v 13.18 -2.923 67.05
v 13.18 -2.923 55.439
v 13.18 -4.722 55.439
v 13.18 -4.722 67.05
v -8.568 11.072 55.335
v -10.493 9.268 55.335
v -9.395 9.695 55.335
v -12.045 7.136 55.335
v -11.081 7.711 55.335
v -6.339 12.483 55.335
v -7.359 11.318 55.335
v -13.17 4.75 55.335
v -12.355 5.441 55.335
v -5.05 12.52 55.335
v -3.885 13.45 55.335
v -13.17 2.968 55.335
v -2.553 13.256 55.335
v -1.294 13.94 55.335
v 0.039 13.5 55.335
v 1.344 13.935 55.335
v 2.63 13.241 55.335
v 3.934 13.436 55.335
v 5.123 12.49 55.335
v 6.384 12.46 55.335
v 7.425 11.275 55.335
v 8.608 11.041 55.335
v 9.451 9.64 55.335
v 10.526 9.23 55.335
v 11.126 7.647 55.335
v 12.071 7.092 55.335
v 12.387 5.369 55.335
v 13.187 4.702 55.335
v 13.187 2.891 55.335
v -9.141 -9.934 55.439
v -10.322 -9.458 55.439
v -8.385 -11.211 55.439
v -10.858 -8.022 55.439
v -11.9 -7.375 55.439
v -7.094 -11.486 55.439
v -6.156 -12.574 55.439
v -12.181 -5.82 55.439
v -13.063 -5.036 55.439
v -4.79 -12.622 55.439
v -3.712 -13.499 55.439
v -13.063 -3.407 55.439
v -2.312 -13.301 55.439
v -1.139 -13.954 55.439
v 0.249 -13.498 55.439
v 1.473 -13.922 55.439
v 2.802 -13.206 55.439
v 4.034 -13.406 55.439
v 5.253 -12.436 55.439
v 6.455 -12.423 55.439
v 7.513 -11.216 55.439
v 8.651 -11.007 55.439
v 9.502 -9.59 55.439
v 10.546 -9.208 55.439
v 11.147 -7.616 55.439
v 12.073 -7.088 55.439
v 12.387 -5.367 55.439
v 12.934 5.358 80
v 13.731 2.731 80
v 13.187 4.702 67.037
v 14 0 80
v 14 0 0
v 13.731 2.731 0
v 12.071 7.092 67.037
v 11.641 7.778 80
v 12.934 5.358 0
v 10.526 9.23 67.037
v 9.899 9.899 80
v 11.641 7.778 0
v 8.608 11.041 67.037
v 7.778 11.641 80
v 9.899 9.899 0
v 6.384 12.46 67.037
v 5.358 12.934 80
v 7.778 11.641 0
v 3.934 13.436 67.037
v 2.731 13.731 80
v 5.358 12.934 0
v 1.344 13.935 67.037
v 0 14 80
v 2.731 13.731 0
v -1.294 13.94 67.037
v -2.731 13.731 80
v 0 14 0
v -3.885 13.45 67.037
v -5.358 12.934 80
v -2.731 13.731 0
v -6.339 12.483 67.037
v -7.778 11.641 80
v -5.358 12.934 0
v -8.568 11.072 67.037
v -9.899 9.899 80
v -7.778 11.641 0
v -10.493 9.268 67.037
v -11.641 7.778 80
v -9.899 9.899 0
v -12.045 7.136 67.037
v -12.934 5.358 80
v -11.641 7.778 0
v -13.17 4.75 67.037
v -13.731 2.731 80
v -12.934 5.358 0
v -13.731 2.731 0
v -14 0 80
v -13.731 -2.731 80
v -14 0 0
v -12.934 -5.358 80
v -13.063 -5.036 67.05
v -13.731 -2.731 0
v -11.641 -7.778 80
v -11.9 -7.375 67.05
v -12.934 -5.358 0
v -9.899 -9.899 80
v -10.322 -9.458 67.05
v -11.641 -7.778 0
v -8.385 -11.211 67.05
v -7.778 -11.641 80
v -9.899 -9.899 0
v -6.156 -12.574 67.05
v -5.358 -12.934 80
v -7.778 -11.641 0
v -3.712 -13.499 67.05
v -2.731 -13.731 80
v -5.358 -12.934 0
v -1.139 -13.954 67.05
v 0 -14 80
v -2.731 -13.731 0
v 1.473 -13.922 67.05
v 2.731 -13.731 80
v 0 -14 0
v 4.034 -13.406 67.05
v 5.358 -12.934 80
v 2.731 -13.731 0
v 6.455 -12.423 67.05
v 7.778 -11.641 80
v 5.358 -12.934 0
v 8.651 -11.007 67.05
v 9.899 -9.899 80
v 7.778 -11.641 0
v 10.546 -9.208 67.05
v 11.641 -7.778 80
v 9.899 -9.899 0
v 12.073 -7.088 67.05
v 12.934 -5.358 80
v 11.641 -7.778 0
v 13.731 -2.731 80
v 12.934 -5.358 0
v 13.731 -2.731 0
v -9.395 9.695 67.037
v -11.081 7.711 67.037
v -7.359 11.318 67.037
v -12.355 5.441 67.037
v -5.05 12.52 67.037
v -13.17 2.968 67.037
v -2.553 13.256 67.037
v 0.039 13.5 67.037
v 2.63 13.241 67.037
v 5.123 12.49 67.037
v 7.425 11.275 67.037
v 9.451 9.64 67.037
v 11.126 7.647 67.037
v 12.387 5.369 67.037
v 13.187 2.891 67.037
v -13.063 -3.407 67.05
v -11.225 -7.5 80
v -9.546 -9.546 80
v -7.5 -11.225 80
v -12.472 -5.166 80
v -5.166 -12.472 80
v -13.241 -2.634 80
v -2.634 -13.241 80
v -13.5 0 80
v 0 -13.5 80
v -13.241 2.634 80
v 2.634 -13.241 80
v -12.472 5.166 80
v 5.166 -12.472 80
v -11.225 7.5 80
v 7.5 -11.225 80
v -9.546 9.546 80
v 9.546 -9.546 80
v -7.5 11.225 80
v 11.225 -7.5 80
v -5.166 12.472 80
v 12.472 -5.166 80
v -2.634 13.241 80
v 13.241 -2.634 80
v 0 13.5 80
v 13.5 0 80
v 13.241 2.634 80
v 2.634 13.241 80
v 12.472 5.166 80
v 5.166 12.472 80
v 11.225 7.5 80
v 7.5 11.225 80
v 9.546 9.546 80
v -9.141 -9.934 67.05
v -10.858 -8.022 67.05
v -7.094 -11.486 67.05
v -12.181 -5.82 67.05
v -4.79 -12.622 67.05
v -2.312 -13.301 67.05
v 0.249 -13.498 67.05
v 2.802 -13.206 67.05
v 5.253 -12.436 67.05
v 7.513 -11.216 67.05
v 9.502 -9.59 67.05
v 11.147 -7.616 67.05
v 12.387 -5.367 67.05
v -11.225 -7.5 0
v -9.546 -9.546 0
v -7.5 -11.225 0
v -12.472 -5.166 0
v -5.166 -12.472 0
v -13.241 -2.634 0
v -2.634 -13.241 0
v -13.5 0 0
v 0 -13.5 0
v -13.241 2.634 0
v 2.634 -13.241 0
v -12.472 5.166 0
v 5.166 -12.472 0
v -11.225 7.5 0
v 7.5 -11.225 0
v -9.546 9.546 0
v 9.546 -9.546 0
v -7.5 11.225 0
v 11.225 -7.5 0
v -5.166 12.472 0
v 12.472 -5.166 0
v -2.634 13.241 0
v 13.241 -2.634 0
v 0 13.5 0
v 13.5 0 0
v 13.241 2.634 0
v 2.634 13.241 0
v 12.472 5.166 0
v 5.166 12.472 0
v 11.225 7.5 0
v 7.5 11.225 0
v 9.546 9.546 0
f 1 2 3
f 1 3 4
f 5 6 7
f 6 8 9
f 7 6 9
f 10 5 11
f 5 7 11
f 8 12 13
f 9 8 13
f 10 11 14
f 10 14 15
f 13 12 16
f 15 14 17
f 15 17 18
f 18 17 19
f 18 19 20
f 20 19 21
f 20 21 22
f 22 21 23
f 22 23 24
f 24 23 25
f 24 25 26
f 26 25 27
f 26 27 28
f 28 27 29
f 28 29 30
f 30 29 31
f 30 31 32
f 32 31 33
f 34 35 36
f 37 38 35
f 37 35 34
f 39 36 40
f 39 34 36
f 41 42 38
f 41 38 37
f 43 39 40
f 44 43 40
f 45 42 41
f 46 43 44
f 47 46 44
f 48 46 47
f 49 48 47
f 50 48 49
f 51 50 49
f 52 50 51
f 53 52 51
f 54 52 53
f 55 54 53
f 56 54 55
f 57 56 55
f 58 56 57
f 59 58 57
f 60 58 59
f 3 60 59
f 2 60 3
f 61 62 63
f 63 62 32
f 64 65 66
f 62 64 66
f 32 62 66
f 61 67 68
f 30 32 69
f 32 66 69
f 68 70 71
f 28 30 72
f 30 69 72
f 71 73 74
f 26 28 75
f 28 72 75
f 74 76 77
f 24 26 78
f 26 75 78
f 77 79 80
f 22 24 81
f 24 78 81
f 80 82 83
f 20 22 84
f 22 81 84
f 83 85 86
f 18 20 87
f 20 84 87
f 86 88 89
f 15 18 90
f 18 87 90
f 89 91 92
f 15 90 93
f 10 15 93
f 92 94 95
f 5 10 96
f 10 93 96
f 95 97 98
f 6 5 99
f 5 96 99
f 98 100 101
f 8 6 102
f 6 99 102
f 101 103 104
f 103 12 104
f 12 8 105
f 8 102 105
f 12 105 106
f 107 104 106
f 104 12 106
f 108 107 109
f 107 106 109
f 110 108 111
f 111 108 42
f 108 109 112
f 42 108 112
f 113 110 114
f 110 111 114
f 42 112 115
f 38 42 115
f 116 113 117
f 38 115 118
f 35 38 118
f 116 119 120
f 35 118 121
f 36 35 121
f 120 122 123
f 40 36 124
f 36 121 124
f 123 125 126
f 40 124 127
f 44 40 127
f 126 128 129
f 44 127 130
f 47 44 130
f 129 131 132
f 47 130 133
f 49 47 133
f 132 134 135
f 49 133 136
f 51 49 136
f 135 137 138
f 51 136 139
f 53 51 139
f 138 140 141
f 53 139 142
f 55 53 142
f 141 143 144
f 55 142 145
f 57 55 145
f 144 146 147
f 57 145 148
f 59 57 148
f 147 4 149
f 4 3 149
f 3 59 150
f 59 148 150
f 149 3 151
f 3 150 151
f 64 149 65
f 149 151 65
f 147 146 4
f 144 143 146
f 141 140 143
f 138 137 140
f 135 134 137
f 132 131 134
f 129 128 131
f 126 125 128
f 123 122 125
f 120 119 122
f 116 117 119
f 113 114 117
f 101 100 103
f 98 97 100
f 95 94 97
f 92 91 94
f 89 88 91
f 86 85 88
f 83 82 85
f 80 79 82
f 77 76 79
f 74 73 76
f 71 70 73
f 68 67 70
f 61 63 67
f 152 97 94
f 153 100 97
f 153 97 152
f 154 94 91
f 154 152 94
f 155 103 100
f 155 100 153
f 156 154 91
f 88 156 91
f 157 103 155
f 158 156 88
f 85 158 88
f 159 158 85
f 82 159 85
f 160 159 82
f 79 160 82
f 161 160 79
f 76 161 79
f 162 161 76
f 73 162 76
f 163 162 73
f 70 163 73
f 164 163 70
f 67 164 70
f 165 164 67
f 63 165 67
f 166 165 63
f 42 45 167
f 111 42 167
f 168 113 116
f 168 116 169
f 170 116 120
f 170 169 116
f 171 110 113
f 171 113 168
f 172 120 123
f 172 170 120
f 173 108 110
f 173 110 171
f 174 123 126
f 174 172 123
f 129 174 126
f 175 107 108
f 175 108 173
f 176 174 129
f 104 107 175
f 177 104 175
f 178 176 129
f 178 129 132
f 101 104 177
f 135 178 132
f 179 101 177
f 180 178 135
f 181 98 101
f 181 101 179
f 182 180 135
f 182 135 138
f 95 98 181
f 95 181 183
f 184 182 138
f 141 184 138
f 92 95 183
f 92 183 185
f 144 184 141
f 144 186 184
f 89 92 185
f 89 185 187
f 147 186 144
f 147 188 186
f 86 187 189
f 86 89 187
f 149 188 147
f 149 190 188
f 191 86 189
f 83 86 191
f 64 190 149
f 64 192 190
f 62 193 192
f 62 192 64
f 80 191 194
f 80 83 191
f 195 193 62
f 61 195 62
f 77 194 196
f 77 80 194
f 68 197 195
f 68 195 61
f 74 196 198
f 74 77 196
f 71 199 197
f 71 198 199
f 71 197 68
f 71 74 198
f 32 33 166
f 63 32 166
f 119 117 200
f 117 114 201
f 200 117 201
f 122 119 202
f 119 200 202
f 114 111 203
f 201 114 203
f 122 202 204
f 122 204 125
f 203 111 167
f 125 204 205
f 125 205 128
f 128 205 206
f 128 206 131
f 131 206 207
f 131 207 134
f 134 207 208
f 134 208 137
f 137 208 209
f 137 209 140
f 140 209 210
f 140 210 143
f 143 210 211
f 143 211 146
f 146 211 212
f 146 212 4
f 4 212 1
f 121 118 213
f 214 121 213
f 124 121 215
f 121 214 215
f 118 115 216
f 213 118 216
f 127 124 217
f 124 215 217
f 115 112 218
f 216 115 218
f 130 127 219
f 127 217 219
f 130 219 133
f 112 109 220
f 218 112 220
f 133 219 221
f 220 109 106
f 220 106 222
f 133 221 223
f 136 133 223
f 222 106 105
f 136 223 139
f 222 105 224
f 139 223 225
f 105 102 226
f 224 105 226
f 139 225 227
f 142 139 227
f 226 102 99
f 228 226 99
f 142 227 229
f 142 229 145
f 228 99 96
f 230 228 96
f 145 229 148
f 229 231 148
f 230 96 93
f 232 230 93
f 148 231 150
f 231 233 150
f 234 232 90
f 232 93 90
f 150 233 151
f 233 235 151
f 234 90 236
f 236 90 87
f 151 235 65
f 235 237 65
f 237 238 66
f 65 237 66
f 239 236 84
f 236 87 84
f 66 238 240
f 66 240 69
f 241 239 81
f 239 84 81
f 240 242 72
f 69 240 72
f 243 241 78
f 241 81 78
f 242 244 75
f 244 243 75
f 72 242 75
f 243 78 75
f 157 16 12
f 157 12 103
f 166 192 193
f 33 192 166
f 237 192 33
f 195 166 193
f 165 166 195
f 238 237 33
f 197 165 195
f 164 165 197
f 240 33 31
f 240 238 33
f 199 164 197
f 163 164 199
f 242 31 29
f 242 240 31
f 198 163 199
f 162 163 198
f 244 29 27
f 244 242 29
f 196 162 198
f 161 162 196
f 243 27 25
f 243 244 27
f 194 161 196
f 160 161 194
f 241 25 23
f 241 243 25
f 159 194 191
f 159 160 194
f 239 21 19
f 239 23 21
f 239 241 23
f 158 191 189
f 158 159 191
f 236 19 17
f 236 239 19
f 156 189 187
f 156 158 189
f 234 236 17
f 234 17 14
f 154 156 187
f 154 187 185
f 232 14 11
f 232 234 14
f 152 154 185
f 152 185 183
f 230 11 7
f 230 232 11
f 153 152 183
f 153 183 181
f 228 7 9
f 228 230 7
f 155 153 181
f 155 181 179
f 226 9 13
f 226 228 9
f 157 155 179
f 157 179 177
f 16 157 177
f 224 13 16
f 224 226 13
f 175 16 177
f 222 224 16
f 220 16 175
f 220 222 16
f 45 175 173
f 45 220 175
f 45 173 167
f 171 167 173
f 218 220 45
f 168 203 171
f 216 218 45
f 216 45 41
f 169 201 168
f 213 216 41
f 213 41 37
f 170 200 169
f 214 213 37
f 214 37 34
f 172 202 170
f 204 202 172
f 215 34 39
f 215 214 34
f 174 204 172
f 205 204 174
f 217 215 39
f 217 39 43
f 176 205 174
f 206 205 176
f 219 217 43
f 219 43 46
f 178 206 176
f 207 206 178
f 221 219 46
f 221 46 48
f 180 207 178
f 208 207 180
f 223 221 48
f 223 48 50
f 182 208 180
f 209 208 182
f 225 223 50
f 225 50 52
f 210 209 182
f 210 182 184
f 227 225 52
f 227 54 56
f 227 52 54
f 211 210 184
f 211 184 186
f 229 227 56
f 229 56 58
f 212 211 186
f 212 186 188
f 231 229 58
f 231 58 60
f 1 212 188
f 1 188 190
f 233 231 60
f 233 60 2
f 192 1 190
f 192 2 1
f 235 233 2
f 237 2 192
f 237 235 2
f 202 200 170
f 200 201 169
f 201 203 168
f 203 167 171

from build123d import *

# Parameters (mm, degrees)
F0_R     = 14
F0_R_2   = 13.5
F1_DEPTH = 80
F2_W     = 26.356387
F2_H     = 11.70228
F3_DEPTH = 25.4
F4_W     = 26.242665
F4_H     = 11.610649
F5_DEPTH = 25.4


with BuildPart() as f1:
    # F0 (on Top) → F1 (new body)
    with BuildSketch(Plane.XY):
        Circle(F0_R)
        Circle(F0_R_2, mode=Mode.SUBTRACT)
    extrude(amount=F1_DEPTH)

    # F2 (on Front) → F3 (cut)
    with BuildSketch(Plane.XZ):
        with Locations((0.00854, 61.186025)):
            Rectangle(F2_W, F2_H)
    extrude(amount=-F3_DEPTH, mode=Mode.SUBTRACT)

    # F4 (on Front) → F5 (cut)
    with BuildSketch(Plane.XZ):
        with Locations((0.058447, 61.244421)):
            Rectangle(F4_W, F4_H)
    extrude(amount=F5_DEPTH, mode=Mode.SUBTRACT)


solid = f1.part
